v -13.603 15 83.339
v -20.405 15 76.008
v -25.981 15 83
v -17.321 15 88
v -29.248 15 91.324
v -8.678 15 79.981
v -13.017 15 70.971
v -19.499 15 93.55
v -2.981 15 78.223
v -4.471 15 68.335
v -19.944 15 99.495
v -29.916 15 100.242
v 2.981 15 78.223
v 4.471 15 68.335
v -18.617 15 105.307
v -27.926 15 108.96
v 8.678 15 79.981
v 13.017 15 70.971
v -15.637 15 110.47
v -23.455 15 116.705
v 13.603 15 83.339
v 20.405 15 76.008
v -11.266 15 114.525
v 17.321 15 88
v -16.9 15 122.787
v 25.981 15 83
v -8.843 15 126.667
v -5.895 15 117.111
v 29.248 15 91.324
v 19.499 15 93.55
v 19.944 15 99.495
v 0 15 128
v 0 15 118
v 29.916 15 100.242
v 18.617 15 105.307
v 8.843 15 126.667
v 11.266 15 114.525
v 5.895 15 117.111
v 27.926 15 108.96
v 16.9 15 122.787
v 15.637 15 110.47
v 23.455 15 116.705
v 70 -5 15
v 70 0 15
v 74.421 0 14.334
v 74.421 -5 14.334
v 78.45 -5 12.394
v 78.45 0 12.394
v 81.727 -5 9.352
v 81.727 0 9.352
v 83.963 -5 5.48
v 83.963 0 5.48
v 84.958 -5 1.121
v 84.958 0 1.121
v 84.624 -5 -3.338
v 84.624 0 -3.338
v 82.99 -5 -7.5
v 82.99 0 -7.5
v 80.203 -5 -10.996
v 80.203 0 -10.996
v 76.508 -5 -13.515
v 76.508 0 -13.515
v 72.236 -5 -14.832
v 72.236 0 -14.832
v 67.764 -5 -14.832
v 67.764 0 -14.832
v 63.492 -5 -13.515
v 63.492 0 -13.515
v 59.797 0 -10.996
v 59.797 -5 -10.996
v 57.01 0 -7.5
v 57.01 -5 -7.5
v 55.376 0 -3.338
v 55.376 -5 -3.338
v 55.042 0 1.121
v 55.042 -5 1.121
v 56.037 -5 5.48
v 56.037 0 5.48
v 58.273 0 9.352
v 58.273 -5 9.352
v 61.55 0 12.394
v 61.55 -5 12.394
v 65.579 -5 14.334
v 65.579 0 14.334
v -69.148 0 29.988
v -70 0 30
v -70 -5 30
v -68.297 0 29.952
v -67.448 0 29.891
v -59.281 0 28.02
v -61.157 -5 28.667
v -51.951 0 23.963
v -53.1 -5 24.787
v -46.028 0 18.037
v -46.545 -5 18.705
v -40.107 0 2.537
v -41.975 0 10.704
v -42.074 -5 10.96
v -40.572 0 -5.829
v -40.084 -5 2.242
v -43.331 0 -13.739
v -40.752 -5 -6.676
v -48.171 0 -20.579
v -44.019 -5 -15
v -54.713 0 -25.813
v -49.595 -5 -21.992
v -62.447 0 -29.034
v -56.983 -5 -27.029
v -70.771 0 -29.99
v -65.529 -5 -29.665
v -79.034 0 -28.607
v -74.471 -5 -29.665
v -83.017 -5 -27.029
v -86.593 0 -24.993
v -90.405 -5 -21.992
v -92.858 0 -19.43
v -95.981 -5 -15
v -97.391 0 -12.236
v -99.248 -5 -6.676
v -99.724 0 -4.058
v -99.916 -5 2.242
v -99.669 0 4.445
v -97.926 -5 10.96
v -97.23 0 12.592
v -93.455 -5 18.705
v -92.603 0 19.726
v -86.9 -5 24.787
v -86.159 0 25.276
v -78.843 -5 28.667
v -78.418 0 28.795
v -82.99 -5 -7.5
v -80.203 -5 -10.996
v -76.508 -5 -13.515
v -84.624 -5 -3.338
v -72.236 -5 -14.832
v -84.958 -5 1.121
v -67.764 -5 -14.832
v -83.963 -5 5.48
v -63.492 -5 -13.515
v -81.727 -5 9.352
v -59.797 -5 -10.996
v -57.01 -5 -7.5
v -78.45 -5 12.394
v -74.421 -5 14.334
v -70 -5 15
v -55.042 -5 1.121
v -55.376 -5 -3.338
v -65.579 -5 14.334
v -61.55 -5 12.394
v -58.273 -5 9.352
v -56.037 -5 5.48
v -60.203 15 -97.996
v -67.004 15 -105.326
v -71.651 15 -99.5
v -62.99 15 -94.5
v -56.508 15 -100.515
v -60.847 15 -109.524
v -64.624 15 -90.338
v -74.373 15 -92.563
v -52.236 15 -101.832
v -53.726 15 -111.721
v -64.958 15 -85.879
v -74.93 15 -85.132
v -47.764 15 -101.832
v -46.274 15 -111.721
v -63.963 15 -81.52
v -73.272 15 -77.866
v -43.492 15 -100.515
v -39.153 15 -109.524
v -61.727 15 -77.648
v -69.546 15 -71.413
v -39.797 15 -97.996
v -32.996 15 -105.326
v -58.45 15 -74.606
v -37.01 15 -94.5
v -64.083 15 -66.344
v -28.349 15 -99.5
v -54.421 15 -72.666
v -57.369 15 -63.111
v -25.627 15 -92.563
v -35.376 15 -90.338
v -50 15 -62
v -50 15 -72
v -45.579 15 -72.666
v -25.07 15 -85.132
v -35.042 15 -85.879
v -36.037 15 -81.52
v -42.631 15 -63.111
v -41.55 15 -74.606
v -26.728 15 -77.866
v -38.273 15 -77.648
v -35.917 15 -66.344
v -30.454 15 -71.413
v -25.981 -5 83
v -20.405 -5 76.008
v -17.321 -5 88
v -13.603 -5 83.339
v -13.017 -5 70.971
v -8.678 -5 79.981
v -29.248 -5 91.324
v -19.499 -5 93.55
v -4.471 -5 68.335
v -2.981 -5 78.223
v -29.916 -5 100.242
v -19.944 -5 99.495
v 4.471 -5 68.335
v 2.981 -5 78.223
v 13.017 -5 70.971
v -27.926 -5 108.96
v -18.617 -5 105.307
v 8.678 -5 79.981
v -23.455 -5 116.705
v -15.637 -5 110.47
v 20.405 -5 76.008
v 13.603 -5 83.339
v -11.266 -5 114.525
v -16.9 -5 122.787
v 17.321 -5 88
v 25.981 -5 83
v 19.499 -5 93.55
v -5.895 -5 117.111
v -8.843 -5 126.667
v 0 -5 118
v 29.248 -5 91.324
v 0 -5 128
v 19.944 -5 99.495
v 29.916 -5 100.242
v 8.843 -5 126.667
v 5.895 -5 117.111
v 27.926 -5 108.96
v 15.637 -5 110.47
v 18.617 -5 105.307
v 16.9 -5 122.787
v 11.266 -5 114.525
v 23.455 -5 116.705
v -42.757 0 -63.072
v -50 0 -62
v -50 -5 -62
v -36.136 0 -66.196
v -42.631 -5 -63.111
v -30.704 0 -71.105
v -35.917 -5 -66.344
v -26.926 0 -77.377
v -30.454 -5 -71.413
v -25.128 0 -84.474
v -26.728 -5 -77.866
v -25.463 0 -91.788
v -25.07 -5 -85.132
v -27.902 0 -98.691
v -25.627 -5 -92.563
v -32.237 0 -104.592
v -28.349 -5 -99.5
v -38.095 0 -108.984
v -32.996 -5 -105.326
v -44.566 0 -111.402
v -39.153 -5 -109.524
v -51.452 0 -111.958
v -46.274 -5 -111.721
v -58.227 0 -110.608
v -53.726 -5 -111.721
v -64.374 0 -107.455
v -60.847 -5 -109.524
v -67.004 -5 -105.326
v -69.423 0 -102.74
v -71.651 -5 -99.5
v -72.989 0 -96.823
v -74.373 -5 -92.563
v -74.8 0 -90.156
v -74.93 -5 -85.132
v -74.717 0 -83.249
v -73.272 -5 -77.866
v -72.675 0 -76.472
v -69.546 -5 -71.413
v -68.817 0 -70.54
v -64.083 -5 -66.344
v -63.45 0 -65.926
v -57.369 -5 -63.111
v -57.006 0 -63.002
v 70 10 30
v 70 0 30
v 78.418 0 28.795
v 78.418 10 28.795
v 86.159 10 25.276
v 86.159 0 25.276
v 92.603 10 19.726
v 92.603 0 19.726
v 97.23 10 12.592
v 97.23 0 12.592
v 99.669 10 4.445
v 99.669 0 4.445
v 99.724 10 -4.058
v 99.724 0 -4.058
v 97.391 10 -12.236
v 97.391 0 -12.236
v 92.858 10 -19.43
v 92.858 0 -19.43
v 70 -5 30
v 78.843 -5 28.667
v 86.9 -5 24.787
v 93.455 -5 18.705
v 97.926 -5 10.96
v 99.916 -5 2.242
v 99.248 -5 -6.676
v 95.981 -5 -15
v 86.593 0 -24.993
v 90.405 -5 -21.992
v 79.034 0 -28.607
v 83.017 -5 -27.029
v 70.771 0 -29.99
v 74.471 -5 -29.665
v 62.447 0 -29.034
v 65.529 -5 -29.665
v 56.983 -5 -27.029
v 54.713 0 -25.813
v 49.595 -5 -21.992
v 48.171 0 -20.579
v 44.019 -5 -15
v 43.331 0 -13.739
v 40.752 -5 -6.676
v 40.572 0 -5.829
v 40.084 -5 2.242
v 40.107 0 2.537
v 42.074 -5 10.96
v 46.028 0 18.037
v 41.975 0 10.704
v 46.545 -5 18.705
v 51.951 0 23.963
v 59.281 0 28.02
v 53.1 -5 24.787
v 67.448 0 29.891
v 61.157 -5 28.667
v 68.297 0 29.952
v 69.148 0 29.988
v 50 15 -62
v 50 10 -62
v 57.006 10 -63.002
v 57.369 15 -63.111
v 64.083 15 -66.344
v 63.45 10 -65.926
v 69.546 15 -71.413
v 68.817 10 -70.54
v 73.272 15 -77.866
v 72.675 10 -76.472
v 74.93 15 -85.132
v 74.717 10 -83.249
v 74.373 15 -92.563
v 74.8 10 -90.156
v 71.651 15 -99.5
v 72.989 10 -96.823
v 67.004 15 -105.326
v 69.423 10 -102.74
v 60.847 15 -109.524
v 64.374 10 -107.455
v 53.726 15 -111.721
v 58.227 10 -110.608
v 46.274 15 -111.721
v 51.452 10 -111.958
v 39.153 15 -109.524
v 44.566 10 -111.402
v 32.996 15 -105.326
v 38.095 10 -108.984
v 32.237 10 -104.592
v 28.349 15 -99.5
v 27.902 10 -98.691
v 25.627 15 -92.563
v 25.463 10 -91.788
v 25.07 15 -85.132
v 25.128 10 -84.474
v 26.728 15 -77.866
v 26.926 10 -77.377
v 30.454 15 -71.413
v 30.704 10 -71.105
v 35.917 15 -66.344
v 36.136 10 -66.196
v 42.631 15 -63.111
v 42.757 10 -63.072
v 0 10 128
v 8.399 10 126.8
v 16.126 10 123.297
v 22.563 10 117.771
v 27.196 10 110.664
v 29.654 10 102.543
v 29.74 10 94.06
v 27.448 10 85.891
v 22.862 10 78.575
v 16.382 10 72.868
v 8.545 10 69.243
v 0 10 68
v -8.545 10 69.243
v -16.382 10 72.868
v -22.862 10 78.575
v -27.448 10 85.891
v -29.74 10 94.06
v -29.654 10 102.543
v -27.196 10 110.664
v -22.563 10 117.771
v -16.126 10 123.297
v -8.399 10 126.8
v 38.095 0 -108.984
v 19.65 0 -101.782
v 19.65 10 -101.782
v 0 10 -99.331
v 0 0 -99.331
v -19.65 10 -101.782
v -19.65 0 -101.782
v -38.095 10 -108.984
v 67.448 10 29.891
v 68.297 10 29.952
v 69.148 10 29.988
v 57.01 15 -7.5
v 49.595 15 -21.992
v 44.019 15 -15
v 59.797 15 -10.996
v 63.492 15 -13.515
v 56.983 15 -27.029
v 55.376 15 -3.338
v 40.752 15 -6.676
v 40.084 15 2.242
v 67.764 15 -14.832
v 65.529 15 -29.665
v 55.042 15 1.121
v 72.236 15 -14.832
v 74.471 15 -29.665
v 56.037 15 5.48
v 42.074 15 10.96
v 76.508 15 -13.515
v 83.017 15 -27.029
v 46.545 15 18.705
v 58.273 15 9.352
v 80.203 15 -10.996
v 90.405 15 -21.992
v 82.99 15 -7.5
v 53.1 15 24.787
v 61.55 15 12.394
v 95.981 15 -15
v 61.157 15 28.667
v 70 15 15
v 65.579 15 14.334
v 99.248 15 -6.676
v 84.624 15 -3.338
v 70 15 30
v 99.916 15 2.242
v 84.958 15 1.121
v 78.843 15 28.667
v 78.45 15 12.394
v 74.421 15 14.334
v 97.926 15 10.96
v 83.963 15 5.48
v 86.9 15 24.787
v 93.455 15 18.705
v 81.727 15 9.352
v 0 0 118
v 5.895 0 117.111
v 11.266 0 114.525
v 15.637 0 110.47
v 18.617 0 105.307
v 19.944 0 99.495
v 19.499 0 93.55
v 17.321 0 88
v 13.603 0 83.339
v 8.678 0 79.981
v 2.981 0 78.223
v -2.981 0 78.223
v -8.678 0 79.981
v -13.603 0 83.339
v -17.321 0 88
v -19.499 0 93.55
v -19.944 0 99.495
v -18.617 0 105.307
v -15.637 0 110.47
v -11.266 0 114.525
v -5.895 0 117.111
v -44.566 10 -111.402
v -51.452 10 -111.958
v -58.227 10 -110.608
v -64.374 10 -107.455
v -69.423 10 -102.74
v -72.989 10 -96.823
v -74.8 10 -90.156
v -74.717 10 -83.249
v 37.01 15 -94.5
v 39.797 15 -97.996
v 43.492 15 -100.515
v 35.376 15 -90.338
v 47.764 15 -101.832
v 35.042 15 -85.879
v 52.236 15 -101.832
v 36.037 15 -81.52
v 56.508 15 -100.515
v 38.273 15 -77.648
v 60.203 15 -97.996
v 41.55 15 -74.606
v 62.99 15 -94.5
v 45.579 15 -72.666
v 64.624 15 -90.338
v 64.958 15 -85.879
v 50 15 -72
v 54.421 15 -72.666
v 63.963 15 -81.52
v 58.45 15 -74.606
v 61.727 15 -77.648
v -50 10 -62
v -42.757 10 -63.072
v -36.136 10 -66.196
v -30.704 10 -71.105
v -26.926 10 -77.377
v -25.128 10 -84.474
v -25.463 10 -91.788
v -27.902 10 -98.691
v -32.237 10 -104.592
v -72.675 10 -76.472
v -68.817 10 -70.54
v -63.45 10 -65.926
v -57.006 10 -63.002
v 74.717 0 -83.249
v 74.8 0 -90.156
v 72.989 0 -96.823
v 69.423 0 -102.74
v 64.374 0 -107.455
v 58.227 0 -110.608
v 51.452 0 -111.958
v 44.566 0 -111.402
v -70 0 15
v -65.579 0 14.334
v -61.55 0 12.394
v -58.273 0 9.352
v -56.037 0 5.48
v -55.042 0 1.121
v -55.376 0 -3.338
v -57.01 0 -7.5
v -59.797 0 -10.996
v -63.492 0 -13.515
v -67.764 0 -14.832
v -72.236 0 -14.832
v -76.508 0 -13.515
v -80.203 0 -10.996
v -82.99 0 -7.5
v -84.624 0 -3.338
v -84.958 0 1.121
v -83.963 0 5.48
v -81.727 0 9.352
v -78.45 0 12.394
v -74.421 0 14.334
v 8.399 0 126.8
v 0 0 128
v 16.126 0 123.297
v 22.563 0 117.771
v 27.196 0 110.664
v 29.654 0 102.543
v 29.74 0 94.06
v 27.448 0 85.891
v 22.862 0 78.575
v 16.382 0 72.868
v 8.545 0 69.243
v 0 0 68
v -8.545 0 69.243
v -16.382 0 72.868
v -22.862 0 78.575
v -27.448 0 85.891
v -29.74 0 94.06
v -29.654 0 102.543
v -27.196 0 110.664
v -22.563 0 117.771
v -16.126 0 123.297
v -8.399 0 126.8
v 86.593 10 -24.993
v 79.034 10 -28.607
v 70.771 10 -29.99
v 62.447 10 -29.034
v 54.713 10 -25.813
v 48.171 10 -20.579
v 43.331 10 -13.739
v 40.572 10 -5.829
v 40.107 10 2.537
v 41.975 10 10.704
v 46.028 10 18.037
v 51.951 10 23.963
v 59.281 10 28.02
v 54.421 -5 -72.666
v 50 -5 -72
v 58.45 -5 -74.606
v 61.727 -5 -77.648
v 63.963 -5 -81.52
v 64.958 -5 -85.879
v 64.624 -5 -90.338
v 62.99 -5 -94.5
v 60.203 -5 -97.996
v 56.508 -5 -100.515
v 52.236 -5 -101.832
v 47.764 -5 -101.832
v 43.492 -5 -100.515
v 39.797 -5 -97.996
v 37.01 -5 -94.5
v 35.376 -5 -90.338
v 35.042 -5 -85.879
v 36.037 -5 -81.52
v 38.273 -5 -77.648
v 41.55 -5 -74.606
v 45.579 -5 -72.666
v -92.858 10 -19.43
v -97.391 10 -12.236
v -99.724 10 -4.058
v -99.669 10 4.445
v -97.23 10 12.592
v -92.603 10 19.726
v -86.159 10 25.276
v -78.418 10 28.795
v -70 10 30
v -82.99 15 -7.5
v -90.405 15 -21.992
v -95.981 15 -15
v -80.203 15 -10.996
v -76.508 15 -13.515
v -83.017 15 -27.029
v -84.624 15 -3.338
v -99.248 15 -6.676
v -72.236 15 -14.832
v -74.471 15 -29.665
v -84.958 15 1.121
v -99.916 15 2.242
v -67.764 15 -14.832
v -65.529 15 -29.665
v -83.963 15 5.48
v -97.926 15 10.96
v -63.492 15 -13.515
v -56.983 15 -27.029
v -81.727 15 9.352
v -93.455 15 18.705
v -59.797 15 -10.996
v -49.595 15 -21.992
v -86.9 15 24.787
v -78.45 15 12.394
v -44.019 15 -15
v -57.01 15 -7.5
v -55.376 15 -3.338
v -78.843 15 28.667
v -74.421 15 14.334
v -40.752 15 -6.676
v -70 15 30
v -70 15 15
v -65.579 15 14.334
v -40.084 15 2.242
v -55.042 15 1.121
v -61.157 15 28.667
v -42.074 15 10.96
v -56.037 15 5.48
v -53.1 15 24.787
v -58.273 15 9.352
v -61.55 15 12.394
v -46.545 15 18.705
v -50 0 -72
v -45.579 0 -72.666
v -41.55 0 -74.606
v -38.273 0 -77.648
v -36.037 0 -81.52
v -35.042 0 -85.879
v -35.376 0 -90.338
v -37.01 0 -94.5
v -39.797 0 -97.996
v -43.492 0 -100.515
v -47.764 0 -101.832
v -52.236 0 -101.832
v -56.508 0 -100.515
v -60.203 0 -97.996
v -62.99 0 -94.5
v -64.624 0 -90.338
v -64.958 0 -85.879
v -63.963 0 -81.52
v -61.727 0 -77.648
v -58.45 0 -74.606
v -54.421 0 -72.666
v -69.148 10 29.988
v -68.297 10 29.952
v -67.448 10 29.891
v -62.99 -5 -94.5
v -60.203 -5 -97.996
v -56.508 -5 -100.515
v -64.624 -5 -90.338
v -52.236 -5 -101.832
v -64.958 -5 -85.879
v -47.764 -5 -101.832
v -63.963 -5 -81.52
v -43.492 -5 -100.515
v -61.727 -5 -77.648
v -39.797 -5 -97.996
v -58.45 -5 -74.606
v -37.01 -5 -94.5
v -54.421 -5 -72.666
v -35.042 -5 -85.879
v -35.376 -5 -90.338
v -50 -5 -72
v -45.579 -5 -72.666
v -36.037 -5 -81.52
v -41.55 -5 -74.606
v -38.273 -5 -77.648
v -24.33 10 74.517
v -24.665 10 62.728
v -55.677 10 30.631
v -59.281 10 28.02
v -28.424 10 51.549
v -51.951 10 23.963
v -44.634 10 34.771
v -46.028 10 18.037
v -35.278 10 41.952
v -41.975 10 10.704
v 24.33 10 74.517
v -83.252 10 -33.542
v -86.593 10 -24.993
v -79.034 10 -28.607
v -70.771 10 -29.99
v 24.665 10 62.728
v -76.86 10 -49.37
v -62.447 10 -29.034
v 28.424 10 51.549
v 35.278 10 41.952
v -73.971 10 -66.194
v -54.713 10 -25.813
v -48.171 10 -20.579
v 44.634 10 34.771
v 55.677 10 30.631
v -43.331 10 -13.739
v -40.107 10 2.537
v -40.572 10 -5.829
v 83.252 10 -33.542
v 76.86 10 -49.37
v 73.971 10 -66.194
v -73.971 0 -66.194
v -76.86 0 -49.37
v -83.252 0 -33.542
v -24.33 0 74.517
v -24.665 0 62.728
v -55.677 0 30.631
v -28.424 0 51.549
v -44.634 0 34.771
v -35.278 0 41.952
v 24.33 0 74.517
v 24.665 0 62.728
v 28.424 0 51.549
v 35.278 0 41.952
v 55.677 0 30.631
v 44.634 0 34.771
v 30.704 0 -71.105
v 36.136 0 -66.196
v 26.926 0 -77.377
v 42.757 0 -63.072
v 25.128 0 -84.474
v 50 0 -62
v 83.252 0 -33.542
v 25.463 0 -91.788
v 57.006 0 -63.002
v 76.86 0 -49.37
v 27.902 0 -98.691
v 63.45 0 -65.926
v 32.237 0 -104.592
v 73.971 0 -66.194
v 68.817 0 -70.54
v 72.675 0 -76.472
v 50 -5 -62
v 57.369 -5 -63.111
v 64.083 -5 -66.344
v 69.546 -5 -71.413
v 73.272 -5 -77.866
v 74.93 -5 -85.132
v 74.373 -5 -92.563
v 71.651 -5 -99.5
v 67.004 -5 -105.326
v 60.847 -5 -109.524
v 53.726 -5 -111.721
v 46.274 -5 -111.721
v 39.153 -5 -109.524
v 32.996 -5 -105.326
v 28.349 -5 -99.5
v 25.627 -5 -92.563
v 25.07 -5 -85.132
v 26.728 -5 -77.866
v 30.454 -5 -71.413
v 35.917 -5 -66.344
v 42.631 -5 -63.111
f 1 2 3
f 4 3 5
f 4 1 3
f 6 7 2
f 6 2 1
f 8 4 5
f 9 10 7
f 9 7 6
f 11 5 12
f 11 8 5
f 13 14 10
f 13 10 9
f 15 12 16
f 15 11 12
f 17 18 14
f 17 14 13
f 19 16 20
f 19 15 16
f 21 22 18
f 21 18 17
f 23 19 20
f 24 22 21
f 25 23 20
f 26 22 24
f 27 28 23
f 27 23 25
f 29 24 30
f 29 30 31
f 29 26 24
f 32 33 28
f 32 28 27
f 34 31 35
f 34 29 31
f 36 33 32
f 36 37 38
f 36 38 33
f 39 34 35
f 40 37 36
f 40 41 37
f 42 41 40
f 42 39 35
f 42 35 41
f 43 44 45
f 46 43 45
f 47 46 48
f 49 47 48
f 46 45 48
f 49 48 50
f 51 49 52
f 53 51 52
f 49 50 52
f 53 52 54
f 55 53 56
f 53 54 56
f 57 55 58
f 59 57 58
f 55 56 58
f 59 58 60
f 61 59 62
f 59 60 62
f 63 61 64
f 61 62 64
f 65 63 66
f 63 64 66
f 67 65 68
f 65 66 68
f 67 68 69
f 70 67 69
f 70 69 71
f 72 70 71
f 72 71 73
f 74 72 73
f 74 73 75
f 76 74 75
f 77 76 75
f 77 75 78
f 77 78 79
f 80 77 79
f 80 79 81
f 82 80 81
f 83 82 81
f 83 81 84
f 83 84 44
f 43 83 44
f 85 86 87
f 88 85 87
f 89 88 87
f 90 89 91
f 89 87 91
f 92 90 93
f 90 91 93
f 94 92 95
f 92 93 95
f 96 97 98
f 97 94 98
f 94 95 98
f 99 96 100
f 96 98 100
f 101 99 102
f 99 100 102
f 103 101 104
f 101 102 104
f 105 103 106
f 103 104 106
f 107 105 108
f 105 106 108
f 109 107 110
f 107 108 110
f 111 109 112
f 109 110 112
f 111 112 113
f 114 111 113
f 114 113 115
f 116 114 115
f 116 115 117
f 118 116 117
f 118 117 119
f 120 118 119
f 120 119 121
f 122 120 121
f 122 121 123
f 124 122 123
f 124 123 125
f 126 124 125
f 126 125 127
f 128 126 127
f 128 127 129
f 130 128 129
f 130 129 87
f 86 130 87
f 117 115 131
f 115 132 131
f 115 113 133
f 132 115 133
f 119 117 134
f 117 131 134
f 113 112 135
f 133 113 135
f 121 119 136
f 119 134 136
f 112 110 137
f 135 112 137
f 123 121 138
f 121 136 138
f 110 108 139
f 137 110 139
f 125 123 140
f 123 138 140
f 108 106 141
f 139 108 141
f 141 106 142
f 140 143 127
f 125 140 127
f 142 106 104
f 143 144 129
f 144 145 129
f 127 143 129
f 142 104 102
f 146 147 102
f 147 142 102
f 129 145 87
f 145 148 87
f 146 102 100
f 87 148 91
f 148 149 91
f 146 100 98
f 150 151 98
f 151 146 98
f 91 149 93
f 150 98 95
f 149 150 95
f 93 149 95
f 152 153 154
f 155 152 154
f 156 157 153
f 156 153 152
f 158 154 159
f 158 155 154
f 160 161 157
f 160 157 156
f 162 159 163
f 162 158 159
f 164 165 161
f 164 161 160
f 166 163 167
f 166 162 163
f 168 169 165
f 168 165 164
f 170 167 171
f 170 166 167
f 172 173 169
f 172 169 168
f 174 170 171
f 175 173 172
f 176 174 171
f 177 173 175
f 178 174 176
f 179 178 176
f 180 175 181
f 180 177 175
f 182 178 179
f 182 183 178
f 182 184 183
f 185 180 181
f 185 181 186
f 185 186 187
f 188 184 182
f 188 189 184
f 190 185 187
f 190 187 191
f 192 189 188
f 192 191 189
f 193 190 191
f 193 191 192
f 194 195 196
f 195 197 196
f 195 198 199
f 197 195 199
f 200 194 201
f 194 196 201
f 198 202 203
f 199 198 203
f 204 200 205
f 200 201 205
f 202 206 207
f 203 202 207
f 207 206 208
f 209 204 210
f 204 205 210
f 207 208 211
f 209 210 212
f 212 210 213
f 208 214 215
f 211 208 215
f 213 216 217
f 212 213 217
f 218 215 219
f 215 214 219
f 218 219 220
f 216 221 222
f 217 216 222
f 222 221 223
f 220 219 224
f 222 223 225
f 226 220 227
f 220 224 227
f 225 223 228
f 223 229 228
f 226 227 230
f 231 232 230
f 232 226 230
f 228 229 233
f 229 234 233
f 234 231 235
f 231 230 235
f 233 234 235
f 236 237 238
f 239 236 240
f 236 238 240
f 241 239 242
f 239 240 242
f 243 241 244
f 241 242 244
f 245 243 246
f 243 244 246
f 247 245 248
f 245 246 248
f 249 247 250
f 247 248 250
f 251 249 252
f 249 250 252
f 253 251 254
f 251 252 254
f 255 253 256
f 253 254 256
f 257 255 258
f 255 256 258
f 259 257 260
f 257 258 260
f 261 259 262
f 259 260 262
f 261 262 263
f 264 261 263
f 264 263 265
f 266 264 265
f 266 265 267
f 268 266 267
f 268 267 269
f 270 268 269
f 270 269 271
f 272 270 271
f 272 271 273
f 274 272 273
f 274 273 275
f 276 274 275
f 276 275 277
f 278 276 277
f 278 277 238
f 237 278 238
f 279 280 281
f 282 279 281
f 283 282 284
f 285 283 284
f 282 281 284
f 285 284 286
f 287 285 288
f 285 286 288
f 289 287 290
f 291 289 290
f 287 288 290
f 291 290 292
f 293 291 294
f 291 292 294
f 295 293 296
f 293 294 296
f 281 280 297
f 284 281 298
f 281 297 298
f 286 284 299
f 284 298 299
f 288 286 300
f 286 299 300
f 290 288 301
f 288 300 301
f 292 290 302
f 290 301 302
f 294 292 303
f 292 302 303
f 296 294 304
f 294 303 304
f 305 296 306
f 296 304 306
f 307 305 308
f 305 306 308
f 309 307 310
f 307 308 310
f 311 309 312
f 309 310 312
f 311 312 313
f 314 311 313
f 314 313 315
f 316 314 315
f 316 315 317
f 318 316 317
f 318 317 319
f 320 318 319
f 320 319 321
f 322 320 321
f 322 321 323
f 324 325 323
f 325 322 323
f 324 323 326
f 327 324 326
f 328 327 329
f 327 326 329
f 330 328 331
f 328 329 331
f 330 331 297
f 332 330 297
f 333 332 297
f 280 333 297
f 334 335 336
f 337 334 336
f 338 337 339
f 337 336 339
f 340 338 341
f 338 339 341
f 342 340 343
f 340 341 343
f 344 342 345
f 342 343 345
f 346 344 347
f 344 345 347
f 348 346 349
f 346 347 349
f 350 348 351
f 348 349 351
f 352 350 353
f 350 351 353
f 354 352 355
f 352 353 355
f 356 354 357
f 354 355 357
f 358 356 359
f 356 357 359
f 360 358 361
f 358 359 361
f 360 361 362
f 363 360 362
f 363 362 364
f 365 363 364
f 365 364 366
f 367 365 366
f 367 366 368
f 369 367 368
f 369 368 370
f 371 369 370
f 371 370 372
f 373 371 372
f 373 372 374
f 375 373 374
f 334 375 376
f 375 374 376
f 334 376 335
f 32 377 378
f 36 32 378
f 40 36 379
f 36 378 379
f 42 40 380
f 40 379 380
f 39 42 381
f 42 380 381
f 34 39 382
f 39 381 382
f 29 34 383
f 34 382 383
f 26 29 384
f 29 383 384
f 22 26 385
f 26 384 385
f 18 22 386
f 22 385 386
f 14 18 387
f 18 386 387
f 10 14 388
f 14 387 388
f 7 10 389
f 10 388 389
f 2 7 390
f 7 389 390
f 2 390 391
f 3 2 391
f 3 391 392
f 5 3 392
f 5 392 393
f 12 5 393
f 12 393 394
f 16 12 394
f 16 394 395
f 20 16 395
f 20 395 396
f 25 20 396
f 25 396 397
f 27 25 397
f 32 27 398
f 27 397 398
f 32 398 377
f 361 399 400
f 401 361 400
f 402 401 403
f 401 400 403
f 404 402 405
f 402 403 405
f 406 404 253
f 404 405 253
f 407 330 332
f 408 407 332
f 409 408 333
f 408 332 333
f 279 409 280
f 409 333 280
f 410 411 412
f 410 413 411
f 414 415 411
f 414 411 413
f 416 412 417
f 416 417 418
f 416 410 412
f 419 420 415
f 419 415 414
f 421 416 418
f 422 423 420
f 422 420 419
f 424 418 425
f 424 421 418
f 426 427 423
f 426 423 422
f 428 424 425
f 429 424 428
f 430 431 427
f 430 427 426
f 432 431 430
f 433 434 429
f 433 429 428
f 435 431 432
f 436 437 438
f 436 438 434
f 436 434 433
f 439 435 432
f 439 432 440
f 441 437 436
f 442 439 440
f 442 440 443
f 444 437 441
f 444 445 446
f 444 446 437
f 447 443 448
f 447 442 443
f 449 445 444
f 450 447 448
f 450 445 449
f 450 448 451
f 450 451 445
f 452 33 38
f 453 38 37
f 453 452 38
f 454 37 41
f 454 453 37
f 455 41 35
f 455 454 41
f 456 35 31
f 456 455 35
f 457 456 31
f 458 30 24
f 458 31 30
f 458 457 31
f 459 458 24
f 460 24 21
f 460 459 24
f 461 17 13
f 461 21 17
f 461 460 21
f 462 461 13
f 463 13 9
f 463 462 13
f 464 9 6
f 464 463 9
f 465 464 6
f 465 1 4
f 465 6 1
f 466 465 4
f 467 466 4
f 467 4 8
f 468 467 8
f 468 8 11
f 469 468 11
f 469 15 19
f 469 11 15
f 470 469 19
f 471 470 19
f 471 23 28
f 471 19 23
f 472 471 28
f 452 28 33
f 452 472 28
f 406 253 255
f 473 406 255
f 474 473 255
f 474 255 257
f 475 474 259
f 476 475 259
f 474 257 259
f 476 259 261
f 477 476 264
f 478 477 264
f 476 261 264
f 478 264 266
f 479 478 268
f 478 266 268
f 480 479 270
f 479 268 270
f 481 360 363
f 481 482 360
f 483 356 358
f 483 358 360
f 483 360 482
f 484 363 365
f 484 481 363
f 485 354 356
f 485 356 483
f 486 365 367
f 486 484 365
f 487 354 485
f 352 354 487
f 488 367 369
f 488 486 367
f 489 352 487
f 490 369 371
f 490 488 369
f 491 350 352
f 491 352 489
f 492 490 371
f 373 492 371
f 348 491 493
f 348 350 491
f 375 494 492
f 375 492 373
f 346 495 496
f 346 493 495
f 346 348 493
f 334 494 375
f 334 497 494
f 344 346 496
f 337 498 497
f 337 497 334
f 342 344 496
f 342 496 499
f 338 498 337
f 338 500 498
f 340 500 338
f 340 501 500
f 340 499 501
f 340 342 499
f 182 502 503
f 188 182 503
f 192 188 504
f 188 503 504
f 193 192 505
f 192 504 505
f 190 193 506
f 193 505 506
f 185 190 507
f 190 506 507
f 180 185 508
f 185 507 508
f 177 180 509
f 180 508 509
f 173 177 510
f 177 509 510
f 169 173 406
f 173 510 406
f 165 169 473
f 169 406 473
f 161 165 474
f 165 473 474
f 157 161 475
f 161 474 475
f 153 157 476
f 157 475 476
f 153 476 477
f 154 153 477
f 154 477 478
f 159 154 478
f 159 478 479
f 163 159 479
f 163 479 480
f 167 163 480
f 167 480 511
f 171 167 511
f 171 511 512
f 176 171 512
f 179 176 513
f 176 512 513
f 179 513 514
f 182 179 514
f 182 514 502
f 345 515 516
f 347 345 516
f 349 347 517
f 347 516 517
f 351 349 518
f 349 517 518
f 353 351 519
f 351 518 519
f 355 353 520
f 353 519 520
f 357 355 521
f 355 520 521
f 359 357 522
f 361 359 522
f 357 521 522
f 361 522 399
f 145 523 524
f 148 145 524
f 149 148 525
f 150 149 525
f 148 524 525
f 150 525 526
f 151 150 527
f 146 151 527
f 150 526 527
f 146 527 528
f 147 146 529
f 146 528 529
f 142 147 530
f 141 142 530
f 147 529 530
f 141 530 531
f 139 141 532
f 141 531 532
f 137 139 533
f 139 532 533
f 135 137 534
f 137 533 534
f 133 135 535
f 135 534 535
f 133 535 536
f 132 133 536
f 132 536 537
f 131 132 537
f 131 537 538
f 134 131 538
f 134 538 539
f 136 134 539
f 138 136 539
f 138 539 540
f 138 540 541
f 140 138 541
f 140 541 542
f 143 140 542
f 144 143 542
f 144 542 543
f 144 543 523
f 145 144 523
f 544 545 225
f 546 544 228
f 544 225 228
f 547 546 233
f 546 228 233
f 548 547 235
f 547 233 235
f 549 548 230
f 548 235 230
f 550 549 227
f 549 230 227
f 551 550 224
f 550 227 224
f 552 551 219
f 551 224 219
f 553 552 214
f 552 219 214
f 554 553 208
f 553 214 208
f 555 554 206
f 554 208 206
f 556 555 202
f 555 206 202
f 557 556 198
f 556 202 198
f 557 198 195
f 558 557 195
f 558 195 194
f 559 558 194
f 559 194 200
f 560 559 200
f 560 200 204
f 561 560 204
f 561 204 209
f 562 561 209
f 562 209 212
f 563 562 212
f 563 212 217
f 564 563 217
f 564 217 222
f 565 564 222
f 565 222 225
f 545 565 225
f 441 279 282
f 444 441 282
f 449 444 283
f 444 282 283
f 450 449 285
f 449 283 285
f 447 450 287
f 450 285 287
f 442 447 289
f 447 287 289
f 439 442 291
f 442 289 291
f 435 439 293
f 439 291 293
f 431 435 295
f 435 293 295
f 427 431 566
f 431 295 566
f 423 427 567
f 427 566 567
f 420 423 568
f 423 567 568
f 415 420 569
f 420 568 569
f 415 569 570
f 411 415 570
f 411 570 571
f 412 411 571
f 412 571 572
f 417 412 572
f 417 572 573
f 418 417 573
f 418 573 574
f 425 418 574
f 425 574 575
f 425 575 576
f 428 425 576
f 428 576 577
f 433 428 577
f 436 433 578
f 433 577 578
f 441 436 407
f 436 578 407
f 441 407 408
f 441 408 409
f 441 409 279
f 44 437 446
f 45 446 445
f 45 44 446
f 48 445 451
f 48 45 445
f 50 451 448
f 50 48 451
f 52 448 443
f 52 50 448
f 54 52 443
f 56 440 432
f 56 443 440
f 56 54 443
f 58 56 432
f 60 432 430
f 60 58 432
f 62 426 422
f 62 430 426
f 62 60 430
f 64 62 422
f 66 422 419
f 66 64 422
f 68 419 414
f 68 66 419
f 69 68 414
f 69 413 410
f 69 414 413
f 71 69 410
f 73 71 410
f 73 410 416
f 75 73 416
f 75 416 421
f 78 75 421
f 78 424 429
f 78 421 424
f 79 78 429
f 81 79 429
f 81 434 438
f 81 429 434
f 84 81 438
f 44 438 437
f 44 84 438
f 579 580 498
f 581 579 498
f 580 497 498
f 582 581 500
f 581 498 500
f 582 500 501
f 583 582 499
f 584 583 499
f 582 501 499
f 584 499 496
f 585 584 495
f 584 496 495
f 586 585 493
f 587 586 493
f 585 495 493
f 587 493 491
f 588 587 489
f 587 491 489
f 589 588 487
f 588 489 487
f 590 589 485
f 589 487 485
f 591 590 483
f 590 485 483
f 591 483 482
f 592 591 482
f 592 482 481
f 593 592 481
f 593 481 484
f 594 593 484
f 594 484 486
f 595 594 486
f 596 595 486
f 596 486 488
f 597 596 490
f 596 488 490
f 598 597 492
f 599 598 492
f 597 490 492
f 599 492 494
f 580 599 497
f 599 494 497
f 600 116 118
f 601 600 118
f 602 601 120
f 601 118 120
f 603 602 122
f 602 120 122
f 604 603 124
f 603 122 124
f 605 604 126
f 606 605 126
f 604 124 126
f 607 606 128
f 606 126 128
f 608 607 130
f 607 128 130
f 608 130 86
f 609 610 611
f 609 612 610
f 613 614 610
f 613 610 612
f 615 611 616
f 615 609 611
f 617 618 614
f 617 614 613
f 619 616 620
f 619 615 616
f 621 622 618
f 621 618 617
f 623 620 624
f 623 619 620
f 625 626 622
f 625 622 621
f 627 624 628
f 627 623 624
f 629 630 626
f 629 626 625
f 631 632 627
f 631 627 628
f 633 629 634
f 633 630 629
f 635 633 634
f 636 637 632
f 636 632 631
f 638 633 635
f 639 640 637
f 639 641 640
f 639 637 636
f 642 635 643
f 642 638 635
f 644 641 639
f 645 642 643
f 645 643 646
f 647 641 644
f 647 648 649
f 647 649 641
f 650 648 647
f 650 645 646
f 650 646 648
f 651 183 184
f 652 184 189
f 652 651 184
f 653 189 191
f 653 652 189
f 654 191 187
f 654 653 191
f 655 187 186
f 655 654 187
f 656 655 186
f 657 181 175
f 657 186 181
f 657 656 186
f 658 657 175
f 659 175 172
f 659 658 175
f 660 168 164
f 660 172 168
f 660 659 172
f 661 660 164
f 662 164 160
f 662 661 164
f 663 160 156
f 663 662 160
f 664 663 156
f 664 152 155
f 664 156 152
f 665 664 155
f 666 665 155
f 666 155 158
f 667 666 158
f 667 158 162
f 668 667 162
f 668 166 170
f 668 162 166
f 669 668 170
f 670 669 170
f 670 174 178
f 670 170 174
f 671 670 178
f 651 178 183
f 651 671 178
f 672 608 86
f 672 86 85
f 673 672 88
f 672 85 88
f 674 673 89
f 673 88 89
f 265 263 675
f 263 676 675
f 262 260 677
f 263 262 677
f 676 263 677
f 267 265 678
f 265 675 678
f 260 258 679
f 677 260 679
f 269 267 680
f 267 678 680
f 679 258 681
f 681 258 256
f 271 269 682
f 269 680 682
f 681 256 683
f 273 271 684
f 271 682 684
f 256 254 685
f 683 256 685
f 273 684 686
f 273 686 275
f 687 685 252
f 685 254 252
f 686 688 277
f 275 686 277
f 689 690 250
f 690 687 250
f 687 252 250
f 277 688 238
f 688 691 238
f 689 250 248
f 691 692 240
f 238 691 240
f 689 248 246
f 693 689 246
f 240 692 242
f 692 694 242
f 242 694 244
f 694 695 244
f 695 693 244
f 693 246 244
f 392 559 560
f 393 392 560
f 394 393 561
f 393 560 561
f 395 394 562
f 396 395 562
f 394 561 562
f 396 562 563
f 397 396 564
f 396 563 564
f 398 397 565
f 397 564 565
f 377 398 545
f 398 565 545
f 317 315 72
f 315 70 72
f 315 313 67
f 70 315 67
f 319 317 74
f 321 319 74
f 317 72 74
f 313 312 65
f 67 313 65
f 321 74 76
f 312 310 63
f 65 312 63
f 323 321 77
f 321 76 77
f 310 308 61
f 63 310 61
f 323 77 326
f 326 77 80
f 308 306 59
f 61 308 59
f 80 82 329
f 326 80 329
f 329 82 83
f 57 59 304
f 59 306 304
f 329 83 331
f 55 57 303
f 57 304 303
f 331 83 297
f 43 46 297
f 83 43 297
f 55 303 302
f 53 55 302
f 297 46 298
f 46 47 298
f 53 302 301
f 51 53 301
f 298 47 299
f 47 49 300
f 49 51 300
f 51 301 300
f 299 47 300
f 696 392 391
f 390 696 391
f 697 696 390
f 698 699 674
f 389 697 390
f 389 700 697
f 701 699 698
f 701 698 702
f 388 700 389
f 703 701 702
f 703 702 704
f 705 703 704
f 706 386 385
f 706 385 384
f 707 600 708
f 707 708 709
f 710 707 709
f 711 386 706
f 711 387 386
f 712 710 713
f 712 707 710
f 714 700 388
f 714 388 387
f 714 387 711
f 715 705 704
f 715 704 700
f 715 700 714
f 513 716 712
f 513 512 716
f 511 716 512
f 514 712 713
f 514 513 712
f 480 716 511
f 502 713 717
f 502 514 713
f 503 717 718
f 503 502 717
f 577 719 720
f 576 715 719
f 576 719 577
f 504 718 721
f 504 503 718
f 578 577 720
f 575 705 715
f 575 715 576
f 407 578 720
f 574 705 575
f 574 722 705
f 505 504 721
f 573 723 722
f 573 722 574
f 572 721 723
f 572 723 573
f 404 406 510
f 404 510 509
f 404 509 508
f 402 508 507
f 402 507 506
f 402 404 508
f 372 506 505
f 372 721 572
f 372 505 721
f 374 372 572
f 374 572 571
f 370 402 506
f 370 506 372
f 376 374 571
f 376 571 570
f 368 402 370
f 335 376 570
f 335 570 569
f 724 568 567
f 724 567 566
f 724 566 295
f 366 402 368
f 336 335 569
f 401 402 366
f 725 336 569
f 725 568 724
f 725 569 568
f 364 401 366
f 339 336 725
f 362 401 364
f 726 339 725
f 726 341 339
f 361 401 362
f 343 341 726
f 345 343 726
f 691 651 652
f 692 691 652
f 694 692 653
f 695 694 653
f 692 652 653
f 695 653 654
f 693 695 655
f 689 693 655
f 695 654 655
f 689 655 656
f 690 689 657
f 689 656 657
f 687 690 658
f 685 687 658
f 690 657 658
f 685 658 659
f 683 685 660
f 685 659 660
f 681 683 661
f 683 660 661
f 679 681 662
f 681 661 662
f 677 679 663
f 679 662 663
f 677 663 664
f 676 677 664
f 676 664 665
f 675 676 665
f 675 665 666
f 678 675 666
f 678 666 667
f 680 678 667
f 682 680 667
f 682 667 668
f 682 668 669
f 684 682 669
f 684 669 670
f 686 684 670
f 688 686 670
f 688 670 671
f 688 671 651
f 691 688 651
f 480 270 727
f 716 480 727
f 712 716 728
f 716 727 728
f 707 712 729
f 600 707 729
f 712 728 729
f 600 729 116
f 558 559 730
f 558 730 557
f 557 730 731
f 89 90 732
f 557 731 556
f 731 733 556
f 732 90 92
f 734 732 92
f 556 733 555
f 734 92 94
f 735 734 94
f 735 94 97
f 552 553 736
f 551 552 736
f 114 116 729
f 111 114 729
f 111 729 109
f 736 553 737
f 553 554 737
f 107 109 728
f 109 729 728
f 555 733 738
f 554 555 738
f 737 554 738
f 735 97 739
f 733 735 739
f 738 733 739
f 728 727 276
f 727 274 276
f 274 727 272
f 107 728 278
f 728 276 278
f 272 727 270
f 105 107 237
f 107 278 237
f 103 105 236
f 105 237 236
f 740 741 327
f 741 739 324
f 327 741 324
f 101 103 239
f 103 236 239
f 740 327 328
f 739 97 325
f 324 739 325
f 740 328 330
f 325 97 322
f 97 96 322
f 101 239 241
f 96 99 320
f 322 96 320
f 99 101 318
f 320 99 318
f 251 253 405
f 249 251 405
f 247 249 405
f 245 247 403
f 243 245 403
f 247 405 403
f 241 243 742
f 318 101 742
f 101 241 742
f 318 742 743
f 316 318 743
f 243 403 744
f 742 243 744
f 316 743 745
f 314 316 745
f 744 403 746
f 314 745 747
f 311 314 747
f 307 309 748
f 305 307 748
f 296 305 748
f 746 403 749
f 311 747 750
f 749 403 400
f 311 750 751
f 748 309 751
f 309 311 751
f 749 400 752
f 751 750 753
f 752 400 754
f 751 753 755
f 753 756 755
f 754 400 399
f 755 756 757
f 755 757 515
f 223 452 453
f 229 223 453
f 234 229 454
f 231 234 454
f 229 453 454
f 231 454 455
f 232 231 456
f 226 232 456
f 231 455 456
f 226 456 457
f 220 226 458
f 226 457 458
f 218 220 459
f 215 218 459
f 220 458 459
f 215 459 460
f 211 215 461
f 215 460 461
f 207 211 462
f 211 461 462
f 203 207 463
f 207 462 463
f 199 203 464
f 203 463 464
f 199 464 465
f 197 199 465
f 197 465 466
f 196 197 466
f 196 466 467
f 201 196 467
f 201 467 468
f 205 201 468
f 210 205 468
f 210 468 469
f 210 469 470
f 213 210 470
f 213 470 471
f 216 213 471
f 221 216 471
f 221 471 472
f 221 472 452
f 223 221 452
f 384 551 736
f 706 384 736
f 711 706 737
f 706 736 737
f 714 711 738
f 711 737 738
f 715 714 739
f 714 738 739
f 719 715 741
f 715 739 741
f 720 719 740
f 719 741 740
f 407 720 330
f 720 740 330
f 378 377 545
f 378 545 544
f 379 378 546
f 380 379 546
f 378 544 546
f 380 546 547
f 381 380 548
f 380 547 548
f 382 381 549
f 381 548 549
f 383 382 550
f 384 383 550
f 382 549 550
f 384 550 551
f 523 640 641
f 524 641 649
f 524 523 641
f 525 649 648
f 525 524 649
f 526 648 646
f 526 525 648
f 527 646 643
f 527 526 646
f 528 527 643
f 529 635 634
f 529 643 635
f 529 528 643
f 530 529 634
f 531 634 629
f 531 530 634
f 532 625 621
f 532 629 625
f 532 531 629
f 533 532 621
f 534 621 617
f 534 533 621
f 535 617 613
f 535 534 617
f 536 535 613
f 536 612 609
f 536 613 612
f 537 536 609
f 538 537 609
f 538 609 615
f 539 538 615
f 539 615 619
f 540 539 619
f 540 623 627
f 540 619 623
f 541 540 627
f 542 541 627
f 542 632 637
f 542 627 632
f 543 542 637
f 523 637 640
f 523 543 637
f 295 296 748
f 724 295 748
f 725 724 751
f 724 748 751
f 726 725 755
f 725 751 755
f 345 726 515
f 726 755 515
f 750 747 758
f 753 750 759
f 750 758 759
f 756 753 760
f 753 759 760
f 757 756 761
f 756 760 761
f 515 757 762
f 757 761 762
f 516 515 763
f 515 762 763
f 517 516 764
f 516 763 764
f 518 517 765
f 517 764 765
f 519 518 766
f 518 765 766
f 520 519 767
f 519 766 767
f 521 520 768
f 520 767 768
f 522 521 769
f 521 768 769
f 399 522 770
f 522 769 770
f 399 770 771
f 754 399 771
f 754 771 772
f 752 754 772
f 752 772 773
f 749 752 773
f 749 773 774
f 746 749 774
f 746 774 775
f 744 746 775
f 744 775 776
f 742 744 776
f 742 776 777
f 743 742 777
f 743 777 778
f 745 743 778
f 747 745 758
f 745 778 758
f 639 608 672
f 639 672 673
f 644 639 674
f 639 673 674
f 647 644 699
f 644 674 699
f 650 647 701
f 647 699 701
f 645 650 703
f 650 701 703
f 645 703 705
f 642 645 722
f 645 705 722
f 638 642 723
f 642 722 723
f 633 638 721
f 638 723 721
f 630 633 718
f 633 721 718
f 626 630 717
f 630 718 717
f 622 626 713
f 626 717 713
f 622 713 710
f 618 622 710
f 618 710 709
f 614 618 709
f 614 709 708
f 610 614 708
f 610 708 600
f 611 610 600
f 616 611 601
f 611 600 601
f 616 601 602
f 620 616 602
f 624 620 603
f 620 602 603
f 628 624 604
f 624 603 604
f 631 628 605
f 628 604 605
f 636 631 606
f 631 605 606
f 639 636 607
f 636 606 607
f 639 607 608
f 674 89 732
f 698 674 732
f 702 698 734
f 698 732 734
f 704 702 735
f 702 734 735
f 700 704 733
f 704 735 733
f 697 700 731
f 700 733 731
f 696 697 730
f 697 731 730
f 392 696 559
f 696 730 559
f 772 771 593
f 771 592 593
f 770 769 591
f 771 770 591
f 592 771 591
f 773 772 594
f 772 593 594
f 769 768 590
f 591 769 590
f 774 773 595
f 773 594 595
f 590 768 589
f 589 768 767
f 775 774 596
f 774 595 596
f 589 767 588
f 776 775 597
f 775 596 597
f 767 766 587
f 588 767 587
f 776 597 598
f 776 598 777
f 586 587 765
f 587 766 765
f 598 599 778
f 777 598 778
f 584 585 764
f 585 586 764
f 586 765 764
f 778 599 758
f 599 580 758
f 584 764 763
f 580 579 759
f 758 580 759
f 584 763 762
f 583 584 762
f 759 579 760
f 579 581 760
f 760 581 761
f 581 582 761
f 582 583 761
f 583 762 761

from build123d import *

# Parameters (mm, degrees)
SKETCH1_R                = 15
SKETCH1_R_2              = 20
BOSS_EXTRUDE2_DEPTH      = 10
BOSS_EXTRUDE3_DEPTH      = 5
BOSS_EXTRUDE3_DEPTH_BACK = 15
SKETCH3_R                = 25
SKETCH3_R_2              = 30
SKETCH1_4_R              = 15
SKETCH1_4_R_2            = 20
CUT_EXTRUDE1_DEPTH       = 25


with BuildPart() as part:
    # Sketch1 → Boss-Extrude2 (new body)
    with BuildSketch(Plane(origin=(0, 0, 0), x_dir=(1, 0, 0), z_dir=(0, 1, 0))):
        with BuildLine():
            ThreePointArc((-38.095238, 108.983554), (-64.373951, 107.454573), (-74.716931, 83.248556))
            ThreePointArc((-74.716931, 83.248556), (-76.859584, 49.370141), (-92.857575, 19.430164))
            ThreePointArc((-92.857575, 19.430164), (-96.668829, -13.73949), (-67.447729, -29.891235))
            ThreePointArc((-67.447729, -29.891235), (-31.495361, -46.496686), (-27.447729, -85.891235))
            ThreePointArc((-27.447729, -85.891235), (0, -128), (27.447729, -85.891235))
            ThreePointArc((27.447729, -85.891235), (31.495361, -46.496686), (67.447729, -29.891235))
            ThreePointArc((67.447729, -29.891235), (96.668829, -13.73949), (92.857575, 19.430164))
            ThreePointArc((92.857575, 19.430164), (76.859584, 49.370141), (74.716931, 83.248556))
            ThreePointArc((74.716931, 83.248556), (64.373951, 107.454573), (38.095238, 108.983554))
            ThreePointArc((38.095238, 108.983554), (0, 99.330927), (-38.095238, 108.983554))
        make_face()
        with Locations((-50, 87)):
            Circle(SKETCH1_R, mode=Mode.SUBTRACT)
        with Locations((-70, 0)):
            Circle(SKETCH1_R, mode=Mode.SUBTRACT)
        with Locations((0, -98)):
            Circle(SKETCH1_R_2, mode=Mode.SUBTRACT)
        with Locations((70, 0)):
            Circle(SKETCH1_R, mode=Mode.SUBTRACT)
        with Locations((50, 87)):
            Circle(SKETCH1_R, mode=Mode.SUBTRACT)
    extrude(amount=BOSS_EXTRUDE2_DEPTH)

    # Sketch3 → Boss-Extrude3 (add, two sides: drawn at the far end of the back side and taken through both)
    with BuildSketch(Plane(origin=(0, 10, 0), x_dir=(1, 0, 0), z_dir=(0, 1, 0)).offset(-BOSS_EXTRUDE3_DEPTH_BACK)):
        with Locations((-50, 87)):
            Circle(SKETCH3_R)
        with Locations((50, 87)):
            Circle(SKETCH3_R)
        with Locations((70, 0)):
            Circle(SKETCH3_R_2)
        with Locations((0, -98)):
            Circle(SKETCH3_R_2)
        with Locations((-70, 0)):
            Circle(SKETCH3_R_2)
    extrude(amount=BOSS_EXTRUDE3_DEPTH + BOSS_EXTRUDE3_DEPTH_BACK)

    # Sketch1<4> → Cut-Extrude1 (cut, symmetric)
    with BuildSketch(Plane(origin=(0, 0, 0), x_dir=(1, 0, 0), z_dir=(0, 1, 0))):
        with Locations((-50, 87)):
            Circle(SKETCH1_4_R)
        with Locations((-70, 0)):
            Circle(SKETCH1_4_R)
        with Locations((0, -98)):
            Circle(SKETCH1_4_R_2)
        with Locations((70, 0)):
            Circle(SKETCH1_4_R)
        with Locations((50, 87)):
            Circle(SKETCH1_4_R)
    extrude(amount=CUT_EXTRUDE1_DEPTH, both=True, mode=Mode.SUBTRACT)


solid = part.part
